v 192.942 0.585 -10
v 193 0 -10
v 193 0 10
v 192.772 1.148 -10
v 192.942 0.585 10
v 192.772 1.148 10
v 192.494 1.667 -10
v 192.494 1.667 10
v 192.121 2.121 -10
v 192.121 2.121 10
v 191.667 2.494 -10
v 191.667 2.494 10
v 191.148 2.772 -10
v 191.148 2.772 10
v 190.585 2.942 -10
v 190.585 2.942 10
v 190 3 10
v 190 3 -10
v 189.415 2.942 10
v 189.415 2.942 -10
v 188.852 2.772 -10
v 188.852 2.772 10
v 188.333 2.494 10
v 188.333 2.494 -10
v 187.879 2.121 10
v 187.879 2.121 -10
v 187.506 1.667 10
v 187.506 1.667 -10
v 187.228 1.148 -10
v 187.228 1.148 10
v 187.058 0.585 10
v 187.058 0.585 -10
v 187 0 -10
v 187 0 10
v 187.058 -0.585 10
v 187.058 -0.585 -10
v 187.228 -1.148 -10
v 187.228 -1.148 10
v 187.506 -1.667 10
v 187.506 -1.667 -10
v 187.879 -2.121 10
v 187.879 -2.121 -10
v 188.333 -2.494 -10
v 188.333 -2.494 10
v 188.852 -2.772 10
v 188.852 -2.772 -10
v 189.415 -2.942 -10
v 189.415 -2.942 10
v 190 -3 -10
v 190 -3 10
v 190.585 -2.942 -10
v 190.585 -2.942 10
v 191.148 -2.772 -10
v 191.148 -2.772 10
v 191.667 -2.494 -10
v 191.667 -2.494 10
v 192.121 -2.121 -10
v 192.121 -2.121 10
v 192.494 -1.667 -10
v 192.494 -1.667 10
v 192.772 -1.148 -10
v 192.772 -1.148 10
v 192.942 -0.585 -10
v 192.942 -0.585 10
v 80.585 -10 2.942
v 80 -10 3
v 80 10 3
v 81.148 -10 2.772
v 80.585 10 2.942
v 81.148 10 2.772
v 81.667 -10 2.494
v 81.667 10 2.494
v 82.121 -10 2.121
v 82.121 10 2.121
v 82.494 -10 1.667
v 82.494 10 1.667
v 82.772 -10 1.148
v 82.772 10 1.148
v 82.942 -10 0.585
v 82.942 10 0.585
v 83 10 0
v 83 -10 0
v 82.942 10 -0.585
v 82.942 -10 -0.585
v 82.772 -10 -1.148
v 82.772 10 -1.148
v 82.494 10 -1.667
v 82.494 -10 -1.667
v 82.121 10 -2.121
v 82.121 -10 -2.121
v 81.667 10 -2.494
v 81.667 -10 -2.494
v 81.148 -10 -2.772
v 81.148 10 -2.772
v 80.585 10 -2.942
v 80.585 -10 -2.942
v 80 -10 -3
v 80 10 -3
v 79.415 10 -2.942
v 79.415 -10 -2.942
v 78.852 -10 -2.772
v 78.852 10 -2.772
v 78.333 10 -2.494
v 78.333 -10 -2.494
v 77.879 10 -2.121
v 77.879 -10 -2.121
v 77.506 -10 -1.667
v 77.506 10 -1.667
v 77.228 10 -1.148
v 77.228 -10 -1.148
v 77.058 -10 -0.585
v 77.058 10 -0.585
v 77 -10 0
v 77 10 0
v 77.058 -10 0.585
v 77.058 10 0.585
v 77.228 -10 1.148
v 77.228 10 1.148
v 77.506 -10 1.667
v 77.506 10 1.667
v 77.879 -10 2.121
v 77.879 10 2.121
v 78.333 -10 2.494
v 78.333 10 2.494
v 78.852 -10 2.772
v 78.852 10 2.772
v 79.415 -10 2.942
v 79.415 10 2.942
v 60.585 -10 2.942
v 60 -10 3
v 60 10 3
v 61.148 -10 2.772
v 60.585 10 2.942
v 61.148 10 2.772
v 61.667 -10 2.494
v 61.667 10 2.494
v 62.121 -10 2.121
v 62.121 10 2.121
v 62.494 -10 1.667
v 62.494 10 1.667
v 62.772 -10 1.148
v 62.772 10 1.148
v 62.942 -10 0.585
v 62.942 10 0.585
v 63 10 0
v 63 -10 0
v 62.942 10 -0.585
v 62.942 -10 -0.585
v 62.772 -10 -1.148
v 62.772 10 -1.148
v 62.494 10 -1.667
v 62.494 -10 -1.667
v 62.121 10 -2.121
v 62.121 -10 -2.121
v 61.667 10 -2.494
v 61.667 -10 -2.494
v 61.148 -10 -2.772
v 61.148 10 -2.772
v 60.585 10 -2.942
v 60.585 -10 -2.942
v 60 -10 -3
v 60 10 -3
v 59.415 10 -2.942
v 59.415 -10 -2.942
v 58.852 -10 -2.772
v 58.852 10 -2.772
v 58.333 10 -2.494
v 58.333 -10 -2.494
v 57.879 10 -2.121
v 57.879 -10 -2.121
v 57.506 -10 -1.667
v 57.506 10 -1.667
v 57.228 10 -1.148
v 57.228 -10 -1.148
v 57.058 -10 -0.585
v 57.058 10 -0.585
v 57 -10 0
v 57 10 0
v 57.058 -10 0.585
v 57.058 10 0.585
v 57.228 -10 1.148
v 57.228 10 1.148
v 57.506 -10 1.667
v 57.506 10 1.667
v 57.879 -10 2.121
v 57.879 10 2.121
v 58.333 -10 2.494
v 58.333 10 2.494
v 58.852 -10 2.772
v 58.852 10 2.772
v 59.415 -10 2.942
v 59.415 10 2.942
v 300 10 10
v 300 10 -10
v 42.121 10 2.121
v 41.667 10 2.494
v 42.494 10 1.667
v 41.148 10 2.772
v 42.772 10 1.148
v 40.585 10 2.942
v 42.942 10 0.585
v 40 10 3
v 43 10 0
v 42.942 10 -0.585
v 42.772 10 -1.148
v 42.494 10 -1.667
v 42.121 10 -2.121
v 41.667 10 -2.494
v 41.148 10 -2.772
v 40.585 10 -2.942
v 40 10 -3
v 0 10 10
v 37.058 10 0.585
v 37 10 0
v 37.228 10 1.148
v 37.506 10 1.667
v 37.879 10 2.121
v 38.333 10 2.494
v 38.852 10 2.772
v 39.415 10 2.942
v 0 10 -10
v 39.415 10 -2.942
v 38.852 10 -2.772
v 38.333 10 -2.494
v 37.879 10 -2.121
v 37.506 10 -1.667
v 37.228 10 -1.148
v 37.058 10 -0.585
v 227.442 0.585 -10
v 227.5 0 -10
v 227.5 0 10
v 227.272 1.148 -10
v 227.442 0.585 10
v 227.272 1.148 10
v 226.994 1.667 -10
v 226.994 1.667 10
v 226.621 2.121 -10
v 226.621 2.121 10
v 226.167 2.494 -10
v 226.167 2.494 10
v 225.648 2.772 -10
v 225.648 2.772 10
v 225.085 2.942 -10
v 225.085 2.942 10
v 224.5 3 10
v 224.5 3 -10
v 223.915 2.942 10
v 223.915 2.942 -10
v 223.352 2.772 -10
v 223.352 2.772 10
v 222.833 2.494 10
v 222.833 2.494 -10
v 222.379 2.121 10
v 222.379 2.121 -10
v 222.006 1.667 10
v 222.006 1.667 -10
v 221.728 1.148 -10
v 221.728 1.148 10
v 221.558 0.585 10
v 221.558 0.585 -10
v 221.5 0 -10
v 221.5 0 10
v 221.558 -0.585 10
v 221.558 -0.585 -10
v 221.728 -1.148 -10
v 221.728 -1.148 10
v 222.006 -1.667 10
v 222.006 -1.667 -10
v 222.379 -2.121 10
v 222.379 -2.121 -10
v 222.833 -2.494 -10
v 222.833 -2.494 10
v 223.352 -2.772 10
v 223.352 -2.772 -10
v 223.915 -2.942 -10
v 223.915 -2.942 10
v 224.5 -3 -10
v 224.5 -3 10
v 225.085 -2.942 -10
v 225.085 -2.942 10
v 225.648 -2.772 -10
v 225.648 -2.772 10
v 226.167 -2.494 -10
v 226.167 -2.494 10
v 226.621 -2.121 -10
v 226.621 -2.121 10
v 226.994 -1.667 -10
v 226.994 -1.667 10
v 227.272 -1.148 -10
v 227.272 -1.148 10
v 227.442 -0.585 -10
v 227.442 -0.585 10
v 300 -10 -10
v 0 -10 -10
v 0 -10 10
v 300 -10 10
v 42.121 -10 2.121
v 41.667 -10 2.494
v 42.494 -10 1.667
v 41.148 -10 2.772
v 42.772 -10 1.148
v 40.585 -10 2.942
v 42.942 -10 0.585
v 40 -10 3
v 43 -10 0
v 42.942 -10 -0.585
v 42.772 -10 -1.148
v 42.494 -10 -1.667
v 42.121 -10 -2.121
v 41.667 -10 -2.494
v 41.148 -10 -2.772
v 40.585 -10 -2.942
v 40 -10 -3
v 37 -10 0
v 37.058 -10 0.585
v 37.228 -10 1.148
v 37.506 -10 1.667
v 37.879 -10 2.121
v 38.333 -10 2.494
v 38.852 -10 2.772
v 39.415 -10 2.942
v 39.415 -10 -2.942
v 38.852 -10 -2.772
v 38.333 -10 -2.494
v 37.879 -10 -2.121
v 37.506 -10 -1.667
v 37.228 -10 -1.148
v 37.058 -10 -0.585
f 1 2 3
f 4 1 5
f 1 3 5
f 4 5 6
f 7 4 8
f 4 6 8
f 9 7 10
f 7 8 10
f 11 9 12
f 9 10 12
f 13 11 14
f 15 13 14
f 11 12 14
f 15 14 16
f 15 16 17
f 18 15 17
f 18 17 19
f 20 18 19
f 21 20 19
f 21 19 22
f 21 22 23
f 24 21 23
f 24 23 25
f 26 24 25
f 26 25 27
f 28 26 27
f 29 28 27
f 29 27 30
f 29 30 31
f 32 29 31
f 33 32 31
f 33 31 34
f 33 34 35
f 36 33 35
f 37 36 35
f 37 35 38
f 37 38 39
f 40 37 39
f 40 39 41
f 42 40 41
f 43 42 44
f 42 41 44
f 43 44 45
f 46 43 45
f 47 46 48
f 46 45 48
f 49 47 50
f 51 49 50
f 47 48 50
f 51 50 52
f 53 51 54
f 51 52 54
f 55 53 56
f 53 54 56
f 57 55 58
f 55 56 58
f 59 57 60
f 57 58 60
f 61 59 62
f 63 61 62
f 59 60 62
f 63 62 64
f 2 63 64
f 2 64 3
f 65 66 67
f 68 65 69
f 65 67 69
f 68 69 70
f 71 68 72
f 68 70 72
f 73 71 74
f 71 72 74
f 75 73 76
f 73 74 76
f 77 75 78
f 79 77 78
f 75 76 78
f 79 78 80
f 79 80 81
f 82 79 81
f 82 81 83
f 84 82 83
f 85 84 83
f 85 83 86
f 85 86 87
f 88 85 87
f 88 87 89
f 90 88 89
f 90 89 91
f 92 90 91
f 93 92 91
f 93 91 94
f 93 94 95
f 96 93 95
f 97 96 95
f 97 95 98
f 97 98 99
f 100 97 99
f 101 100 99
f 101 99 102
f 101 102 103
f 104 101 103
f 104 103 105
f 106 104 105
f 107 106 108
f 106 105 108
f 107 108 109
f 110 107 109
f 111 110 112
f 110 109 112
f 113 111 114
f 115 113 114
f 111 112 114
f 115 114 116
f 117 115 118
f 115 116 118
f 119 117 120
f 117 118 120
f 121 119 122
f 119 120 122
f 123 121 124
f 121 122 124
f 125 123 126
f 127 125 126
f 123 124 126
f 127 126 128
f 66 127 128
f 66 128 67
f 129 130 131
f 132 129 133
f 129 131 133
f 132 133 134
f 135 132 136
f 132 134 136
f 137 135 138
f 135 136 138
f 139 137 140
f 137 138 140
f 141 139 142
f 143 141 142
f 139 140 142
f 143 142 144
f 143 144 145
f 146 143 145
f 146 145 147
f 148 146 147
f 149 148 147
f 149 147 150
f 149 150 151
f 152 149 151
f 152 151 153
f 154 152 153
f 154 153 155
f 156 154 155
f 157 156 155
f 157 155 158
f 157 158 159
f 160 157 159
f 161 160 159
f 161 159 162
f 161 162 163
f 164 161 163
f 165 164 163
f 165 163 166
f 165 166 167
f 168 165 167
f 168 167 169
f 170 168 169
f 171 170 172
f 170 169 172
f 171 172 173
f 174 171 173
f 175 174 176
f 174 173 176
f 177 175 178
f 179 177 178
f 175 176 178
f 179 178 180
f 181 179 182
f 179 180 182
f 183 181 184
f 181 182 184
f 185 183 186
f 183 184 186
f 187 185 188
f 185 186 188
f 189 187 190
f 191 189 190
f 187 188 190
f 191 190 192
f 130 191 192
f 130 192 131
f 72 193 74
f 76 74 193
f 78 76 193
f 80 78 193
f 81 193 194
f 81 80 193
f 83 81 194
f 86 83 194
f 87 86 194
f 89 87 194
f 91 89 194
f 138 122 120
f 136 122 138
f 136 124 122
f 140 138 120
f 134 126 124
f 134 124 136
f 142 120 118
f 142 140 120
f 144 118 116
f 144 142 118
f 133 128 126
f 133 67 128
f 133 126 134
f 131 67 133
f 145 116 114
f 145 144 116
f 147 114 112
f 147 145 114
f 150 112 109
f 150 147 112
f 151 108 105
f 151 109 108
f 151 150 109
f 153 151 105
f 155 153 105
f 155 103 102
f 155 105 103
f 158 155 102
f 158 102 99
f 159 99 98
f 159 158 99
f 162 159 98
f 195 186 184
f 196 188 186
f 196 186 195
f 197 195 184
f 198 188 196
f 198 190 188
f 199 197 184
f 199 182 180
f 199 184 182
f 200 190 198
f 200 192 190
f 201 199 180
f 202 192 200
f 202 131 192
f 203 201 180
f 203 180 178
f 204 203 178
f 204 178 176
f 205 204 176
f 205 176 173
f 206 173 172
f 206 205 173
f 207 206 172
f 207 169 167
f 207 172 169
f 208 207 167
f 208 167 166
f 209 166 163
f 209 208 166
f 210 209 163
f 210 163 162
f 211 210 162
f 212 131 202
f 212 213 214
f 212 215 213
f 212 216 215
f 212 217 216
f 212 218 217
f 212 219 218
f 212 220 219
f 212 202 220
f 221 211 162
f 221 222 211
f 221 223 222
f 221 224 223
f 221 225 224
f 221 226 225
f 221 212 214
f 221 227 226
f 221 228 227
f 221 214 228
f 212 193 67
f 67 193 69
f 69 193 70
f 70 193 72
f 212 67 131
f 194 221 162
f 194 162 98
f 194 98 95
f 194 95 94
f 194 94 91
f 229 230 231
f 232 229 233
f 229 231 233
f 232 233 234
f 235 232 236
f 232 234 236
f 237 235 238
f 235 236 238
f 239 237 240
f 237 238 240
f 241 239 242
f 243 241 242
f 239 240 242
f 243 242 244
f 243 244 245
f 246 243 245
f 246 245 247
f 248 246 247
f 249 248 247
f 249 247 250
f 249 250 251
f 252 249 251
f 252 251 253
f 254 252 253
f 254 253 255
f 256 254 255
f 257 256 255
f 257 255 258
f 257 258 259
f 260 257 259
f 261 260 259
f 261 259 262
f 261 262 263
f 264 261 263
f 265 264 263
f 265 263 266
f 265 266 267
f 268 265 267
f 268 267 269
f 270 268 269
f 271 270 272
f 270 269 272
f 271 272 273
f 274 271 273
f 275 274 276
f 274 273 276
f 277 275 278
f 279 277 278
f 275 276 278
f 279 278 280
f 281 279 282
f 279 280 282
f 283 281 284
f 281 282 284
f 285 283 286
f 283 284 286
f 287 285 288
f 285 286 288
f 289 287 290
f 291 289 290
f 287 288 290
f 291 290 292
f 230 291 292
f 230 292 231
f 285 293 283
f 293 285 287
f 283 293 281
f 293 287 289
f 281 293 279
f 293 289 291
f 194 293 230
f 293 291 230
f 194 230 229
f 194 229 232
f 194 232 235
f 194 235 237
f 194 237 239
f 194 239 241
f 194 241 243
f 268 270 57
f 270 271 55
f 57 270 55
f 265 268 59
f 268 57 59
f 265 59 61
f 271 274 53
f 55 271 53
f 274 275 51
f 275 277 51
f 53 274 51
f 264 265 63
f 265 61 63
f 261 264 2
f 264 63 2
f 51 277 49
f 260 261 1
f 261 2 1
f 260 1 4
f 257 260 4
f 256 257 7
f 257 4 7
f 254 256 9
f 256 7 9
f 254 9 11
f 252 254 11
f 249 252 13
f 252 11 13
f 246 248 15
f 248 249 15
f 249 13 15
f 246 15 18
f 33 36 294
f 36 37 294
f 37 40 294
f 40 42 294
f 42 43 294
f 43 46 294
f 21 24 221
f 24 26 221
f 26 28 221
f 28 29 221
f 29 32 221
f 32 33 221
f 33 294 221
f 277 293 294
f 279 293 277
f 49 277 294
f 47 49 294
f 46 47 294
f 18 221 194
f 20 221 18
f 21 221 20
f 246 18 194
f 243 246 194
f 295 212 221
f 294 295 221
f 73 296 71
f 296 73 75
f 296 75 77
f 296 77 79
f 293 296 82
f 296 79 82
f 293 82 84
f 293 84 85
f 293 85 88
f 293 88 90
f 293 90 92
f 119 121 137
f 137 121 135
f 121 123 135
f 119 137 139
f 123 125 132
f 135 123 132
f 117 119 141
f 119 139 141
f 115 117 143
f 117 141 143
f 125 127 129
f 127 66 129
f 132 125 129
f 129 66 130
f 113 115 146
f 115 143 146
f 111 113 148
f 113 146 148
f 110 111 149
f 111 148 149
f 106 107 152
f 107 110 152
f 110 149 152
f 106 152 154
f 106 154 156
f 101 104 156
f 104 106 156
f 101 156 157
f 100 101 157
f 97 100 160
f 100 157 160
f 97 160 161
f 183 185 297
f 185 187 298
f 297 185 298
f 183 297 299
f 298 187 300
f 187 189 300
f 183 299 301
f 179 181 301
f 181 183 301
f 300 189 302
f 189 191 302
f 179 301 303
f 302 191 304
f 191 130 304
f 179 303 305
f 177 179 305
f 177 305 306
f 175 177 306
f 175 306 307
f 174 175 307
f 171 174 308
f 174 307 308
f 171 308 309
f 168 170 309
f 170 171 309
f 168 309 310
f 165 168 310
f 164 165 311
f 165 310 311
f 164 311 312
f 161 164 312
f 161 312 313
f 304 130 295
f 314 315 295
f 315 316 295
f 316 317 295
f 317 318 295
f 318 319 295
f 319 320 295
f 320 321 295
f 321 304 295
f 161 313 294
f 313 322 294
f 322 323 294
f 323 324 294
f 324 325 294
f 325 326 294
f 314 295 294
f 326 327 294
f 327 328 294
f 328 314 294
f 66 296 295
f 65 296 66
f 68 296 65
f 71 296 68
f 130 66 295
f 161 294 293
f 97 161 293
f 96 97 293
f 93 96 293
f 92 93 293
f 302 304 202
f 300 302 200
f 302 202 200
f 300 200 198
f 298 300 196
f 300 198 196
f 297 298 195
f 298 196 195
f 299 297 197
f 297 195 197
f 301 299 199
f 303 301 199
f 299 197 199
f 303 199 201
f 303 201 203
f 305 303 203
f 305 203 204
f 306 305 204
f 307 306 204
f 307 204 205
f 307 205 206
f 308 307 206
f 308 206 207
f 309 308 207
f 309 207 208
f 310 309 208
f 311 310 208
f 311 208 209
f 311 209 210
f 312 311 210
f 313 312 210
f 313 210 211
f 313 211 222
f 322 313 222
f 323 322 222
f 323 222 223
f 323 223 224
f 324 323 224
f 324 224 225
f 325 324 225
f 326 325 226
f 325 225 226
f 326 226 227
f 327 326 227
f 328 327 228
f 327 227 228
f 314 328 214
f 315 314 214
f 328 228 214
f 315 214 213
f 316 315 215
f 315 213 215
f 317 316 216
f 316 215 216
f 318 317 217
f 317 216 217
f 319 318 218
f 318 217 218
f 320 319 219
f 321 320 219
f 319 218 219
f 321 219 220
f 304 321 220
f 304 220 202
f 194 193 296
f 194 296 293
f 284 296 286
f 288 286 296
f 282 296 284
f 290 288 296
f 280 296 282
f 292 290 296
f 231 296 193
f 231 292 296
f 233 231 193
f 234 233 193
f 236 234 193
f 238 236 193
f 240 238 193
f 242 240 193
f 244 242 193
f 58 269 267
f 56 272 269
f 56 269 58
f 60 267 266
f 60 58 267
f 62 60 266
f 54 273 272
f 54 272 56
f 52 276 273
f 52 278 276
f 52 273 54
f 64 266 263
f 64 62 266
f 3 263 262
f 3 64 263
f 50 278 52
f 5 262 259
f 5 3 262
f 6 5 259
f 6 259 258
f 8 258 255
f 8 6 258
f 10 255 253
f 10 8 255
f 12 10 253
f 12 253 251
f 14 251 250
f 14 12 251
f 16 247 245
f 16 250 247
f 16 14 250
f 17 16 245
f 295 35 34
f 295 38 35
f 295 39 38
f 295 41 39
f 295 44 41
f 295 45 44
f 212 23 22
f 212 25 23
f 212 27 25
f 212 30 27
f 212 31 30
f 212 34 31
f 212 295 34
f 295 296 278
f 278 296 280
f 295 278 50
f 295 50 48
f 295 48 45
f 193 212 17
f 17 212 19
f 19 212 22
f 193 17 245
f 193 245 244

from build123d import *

# Parameters (mm, degrees)
SKIZZE1_W                       = 20
SKIZZE1_H                       = 20
AUFSATZ_LINEAR_AUSTRAGEN1_DEPTH = 300
SKIZZE2_R                       = 3
SCHNITT_LINEAR_AUSTRAGEN1_DEPTH = 301.83217913
SKETCH1_R                       = 3
EXTRUDE1_DEPTH                  = 301.83217913


with BuildPart() as part:
    # Skizze1 → Aufsatz-Linear austragen1 (new body)
    with BuildSketch(Plane(origin=(0, 0, 0), x_dir=(0, 0, -1), z_dir=(1, 0, 0))):
        Rectangle(SKIZZE1_W, SKIZZE1_H)
    extrude(amount=AUFSATZ_LINEAR_AUSTRAGEN1_DEPTH)

    # Skizze2 → Schnitt-Linear austragen1 (cut, through all)
    with BuildSketch(Plane(origin=(0, 10, 0), x_dir=(1, 0, 0), z_dir=(0, 1, 0))):
        with Locations(Location((40, 0, 0), (0, 0, 270))):
            Circle(SKIZZE2_R)
        with Locations(Location((60, 0, 0), (0, 0, 270))):
            Circle(SKIZZE2_R)
        with Locations(Location((80, 0, 0), (0, 0, 270))):
            Circle(SKIZZE2_R)
    extrude(amount=-SCHNITT_LINEAR_AUSTRAGEN1_DEPTH, mode=Mode.SUBTRACT)

    # Sketch1 → Extrude1 (cut, through all)
    with BuildSketch(Plane.XY.offset(10)):
        with Locations((190, 0)):
            Circle(SKETCH1_R)
        with Locations((224.5, 0)):
            Circle(SKETCH1_R)
    extrude(amount=-EXTRUDE1_DEPTH, mode=Mode.SUBTRACT)


solid = part.part
